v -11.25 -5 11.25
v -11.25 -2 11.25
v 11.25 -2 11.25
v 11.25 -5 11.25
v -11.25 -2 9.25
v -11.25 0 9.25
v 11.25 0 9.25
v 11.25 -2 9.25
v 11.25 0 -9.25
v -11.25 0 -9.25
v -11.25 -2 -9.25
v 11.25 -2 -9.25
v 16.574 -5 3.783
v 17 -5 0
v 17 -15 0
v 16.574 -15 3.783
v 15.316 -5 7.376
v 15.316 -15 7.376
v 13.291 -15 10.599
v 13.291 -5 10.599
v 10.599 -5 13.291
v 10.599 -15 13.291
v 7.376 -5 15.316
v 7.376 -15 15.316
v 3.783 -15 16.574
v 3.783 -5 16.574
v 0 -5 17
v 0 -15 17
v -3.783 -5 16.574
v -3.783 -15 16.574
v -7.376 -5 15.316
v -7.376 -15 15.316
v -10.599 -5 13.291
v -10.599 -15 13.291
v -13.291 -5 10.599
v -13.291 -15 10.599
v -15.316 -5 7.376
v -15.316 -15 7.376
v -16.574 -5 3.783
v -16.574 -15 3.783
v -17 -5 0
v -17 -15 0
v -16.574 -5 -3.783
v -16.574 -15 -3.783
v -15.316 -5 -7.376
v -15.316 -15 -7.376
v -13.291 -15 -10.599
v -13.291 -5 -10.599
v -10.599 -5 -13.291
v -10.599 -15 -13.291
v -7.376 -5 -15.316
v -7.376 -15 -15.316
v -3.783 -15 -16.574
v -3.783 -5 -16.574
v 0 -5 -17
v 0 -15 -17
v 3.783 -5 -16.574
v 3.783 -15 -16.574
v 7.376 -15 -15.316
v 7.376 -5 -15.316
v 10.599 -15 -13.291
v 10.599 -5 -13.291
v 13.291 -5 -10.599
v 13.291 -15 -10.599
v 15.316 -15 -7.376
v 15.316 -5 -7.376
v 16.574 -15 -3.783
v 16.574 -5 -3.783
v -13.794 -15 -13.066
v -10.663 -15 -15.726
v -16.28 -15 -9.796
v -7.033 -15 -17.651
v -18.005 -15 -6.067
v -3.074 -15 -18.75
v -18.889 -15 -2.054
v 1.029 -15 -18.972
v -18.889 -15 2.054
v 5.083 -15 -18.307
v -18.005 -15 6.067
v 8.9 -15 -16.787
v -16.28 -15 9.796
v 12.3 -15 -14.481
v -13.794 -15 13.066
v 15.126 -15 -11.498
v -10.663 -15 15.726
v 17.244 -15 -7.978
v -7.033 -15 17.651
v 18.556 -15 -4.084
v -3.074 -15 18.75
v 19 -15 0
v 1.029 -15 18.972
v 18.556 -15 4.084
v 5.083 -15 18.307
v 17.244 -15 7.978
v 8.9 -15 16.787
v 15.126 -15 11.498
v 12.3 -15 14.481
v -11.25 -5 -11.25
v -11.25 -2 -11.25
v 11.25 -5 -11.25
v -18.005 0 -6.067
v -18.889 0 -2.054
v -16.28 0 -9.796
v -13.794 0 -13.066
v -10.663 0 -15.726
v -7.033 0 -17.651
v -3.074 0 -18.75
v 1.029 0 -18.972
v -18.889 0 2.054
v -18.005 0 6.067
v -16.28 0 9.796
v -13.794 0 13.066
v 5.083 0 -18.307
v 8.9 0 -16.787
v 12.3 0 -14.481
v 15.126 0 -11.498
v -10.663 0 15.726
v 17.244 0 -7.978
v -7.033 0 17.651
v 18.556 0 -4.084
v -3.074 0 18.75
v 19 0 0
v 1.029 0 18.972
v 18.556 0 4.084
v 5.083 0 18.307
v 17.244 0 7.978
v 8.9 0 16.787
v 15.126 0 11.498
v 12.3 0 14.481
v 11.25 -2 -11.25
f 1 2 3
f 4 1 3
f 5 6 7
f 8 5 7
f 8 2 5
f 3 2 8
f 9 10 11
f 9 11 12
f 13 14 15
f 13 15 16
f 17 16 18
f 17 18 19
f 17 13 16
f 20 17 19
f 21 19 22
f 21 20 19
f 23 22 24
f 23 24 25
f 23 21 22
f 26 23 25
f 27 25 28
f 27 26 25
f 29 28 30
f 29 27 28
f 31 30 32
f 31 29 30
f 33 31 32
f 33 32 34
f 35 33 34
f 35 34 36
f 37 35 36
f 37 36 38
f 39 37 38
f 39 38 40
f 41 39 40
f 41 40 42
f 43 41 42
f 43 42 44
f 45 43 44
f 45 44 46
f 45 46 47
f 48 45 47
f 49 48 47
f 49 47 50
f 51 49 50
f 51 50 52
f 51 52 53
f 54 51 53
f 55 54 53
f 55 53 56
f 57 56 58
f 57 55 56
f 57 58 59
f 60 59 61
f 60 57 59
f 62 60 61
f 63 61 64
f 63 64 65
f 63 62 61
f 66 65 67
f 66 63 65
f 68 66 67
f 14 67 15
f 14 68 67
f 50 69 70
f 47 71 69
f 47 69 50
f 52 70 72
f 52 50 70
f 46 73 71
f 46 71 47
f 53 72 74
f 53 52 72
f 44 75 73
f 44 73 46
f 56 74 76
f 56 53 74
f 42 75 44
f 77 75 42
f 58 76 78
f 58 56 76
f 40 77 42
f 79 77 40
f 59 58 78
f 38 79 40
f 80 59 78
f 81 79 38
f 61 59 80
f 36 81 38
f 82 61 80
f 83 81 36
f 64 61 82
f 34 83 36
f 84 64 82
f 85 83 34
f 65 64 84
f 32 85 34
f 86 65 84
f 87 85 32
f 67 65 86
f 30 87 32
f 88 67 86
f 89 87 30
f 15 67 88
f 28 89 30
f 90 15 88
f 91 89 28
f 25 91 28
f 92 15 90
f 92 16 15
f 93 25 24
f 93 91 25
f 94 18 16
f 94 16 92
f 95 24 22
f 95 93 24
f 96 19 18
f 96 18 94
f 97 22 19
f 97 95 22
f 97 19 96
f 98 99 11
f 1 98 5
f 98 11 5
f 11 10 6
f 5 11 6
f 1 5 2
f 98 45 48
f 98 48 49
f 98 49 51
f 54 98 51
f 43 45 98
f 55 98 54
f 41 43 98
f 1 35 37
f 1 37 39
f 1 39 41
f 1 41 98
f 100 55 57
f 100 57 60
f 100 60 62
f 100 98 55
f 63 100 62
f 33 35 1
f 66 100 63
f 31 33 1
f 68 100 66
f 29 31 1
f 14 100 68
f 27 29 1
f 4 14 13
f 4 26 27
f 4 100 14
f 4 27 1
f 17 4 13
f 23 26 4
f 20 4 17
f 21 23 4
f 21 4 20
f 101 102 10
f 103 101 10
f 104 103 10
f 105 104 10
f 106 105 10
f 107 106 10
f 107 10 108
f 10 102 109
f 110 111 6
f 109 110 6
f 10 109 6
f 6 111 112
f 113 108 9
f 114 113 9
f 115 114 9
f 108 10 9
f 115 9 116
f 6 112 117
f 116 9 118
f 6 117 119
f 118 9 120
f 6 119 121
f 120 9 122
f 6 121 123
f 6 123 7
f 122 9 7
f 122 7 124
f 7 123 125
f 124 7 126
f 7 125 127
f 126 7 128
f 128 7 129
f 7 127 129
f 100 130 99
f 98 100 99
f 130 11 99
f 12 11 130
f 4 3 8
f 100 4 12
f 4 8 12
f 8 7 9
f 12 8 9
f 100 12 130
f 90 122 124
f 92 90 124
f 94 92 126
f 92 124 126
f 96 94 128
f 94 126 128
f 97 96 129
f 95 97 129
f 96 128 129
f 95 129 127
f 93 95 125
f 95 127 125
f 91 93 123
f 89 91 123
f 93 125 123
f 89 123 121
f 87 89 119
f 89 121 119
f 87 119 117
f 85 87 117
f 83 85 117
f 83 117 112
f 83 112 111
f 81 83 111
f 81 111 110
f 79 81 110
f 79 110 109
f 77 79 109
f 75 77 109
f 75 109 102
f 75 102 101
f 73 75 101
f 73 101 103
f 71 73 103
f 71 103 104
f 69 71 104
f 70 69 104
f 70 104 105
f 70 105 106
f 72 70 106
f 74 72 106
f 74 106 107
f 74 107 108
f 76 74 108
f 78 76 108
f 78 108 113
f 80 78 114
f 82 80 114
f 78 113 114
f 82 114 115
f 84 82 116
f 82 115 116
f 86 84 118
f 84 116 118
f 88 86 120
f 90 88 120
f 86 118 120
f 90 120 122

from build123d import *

# Parameters (mm, degrees)
F0_R     = 17
F1_DEPTH = 5
F0_R_2   = 19
F0_W     = 22.5
F0_H     = 2
F2_DEPTH = 2
F3_DEPTH = 2
F4_DEPTH = 15


with BuildPart() as f1:
    # F0 (on Front) → F1 (new body)
    with BuildSketch(Plane.XZ):
        Circle(F0_R)
        Polygon((11.25, -9.25), (11.25, -11.25), (-11.25, -11.25), (-11.25, -9.25), (-11.25, 9.25), (-11.25, 11.25), (11.25, 11.25), (11.25, 9.25), align=None, mode=Mode.SUBTRACT)
    extrude(amount=F1_DEPTH)

    # F0 (on Front) → F2 (join)
    with BuildSketch(Plane.XZ):
        Circle(F0_R_2)
        Circle(F0_R, mode=Mode.SUBTRACT)
        Circle(F0_R)
        Polygon((11.25, -9.25), (11.25, -11.25), (-11.25, -11.25), (-11.25, -9.25), (-11.25, 9.25), (-11.25, 11.25), (11.25, 11.25), (11.25, 9.25), align=None, mode=Mode.SUBTRACT)
        with Locations((0, 10.25)):
            Rectangle(F0_W, F0_H)
        with Locations((0, -10.25)):
            Rectangle(F0_W, F0_H)
    extrude(amount=F2_DEPTH)

    # F0 (on Front) → F3 (join)
    with BuildSketch(Plane.XZ):
        with Locations((0, -10.25)):
            Rectangle(F0_W, F0_H)
    extrude(amount=F3_DEPTH)

    # F0 (on Front) → F4 (join)
    with BuildSketch(Plane.XZ):
        Circle(F0_R_2)
        Circle(F0_R, mode=Mode.SUBTRACT)
    extrude(amount=F4_DEPTH)


solid = f1.part
